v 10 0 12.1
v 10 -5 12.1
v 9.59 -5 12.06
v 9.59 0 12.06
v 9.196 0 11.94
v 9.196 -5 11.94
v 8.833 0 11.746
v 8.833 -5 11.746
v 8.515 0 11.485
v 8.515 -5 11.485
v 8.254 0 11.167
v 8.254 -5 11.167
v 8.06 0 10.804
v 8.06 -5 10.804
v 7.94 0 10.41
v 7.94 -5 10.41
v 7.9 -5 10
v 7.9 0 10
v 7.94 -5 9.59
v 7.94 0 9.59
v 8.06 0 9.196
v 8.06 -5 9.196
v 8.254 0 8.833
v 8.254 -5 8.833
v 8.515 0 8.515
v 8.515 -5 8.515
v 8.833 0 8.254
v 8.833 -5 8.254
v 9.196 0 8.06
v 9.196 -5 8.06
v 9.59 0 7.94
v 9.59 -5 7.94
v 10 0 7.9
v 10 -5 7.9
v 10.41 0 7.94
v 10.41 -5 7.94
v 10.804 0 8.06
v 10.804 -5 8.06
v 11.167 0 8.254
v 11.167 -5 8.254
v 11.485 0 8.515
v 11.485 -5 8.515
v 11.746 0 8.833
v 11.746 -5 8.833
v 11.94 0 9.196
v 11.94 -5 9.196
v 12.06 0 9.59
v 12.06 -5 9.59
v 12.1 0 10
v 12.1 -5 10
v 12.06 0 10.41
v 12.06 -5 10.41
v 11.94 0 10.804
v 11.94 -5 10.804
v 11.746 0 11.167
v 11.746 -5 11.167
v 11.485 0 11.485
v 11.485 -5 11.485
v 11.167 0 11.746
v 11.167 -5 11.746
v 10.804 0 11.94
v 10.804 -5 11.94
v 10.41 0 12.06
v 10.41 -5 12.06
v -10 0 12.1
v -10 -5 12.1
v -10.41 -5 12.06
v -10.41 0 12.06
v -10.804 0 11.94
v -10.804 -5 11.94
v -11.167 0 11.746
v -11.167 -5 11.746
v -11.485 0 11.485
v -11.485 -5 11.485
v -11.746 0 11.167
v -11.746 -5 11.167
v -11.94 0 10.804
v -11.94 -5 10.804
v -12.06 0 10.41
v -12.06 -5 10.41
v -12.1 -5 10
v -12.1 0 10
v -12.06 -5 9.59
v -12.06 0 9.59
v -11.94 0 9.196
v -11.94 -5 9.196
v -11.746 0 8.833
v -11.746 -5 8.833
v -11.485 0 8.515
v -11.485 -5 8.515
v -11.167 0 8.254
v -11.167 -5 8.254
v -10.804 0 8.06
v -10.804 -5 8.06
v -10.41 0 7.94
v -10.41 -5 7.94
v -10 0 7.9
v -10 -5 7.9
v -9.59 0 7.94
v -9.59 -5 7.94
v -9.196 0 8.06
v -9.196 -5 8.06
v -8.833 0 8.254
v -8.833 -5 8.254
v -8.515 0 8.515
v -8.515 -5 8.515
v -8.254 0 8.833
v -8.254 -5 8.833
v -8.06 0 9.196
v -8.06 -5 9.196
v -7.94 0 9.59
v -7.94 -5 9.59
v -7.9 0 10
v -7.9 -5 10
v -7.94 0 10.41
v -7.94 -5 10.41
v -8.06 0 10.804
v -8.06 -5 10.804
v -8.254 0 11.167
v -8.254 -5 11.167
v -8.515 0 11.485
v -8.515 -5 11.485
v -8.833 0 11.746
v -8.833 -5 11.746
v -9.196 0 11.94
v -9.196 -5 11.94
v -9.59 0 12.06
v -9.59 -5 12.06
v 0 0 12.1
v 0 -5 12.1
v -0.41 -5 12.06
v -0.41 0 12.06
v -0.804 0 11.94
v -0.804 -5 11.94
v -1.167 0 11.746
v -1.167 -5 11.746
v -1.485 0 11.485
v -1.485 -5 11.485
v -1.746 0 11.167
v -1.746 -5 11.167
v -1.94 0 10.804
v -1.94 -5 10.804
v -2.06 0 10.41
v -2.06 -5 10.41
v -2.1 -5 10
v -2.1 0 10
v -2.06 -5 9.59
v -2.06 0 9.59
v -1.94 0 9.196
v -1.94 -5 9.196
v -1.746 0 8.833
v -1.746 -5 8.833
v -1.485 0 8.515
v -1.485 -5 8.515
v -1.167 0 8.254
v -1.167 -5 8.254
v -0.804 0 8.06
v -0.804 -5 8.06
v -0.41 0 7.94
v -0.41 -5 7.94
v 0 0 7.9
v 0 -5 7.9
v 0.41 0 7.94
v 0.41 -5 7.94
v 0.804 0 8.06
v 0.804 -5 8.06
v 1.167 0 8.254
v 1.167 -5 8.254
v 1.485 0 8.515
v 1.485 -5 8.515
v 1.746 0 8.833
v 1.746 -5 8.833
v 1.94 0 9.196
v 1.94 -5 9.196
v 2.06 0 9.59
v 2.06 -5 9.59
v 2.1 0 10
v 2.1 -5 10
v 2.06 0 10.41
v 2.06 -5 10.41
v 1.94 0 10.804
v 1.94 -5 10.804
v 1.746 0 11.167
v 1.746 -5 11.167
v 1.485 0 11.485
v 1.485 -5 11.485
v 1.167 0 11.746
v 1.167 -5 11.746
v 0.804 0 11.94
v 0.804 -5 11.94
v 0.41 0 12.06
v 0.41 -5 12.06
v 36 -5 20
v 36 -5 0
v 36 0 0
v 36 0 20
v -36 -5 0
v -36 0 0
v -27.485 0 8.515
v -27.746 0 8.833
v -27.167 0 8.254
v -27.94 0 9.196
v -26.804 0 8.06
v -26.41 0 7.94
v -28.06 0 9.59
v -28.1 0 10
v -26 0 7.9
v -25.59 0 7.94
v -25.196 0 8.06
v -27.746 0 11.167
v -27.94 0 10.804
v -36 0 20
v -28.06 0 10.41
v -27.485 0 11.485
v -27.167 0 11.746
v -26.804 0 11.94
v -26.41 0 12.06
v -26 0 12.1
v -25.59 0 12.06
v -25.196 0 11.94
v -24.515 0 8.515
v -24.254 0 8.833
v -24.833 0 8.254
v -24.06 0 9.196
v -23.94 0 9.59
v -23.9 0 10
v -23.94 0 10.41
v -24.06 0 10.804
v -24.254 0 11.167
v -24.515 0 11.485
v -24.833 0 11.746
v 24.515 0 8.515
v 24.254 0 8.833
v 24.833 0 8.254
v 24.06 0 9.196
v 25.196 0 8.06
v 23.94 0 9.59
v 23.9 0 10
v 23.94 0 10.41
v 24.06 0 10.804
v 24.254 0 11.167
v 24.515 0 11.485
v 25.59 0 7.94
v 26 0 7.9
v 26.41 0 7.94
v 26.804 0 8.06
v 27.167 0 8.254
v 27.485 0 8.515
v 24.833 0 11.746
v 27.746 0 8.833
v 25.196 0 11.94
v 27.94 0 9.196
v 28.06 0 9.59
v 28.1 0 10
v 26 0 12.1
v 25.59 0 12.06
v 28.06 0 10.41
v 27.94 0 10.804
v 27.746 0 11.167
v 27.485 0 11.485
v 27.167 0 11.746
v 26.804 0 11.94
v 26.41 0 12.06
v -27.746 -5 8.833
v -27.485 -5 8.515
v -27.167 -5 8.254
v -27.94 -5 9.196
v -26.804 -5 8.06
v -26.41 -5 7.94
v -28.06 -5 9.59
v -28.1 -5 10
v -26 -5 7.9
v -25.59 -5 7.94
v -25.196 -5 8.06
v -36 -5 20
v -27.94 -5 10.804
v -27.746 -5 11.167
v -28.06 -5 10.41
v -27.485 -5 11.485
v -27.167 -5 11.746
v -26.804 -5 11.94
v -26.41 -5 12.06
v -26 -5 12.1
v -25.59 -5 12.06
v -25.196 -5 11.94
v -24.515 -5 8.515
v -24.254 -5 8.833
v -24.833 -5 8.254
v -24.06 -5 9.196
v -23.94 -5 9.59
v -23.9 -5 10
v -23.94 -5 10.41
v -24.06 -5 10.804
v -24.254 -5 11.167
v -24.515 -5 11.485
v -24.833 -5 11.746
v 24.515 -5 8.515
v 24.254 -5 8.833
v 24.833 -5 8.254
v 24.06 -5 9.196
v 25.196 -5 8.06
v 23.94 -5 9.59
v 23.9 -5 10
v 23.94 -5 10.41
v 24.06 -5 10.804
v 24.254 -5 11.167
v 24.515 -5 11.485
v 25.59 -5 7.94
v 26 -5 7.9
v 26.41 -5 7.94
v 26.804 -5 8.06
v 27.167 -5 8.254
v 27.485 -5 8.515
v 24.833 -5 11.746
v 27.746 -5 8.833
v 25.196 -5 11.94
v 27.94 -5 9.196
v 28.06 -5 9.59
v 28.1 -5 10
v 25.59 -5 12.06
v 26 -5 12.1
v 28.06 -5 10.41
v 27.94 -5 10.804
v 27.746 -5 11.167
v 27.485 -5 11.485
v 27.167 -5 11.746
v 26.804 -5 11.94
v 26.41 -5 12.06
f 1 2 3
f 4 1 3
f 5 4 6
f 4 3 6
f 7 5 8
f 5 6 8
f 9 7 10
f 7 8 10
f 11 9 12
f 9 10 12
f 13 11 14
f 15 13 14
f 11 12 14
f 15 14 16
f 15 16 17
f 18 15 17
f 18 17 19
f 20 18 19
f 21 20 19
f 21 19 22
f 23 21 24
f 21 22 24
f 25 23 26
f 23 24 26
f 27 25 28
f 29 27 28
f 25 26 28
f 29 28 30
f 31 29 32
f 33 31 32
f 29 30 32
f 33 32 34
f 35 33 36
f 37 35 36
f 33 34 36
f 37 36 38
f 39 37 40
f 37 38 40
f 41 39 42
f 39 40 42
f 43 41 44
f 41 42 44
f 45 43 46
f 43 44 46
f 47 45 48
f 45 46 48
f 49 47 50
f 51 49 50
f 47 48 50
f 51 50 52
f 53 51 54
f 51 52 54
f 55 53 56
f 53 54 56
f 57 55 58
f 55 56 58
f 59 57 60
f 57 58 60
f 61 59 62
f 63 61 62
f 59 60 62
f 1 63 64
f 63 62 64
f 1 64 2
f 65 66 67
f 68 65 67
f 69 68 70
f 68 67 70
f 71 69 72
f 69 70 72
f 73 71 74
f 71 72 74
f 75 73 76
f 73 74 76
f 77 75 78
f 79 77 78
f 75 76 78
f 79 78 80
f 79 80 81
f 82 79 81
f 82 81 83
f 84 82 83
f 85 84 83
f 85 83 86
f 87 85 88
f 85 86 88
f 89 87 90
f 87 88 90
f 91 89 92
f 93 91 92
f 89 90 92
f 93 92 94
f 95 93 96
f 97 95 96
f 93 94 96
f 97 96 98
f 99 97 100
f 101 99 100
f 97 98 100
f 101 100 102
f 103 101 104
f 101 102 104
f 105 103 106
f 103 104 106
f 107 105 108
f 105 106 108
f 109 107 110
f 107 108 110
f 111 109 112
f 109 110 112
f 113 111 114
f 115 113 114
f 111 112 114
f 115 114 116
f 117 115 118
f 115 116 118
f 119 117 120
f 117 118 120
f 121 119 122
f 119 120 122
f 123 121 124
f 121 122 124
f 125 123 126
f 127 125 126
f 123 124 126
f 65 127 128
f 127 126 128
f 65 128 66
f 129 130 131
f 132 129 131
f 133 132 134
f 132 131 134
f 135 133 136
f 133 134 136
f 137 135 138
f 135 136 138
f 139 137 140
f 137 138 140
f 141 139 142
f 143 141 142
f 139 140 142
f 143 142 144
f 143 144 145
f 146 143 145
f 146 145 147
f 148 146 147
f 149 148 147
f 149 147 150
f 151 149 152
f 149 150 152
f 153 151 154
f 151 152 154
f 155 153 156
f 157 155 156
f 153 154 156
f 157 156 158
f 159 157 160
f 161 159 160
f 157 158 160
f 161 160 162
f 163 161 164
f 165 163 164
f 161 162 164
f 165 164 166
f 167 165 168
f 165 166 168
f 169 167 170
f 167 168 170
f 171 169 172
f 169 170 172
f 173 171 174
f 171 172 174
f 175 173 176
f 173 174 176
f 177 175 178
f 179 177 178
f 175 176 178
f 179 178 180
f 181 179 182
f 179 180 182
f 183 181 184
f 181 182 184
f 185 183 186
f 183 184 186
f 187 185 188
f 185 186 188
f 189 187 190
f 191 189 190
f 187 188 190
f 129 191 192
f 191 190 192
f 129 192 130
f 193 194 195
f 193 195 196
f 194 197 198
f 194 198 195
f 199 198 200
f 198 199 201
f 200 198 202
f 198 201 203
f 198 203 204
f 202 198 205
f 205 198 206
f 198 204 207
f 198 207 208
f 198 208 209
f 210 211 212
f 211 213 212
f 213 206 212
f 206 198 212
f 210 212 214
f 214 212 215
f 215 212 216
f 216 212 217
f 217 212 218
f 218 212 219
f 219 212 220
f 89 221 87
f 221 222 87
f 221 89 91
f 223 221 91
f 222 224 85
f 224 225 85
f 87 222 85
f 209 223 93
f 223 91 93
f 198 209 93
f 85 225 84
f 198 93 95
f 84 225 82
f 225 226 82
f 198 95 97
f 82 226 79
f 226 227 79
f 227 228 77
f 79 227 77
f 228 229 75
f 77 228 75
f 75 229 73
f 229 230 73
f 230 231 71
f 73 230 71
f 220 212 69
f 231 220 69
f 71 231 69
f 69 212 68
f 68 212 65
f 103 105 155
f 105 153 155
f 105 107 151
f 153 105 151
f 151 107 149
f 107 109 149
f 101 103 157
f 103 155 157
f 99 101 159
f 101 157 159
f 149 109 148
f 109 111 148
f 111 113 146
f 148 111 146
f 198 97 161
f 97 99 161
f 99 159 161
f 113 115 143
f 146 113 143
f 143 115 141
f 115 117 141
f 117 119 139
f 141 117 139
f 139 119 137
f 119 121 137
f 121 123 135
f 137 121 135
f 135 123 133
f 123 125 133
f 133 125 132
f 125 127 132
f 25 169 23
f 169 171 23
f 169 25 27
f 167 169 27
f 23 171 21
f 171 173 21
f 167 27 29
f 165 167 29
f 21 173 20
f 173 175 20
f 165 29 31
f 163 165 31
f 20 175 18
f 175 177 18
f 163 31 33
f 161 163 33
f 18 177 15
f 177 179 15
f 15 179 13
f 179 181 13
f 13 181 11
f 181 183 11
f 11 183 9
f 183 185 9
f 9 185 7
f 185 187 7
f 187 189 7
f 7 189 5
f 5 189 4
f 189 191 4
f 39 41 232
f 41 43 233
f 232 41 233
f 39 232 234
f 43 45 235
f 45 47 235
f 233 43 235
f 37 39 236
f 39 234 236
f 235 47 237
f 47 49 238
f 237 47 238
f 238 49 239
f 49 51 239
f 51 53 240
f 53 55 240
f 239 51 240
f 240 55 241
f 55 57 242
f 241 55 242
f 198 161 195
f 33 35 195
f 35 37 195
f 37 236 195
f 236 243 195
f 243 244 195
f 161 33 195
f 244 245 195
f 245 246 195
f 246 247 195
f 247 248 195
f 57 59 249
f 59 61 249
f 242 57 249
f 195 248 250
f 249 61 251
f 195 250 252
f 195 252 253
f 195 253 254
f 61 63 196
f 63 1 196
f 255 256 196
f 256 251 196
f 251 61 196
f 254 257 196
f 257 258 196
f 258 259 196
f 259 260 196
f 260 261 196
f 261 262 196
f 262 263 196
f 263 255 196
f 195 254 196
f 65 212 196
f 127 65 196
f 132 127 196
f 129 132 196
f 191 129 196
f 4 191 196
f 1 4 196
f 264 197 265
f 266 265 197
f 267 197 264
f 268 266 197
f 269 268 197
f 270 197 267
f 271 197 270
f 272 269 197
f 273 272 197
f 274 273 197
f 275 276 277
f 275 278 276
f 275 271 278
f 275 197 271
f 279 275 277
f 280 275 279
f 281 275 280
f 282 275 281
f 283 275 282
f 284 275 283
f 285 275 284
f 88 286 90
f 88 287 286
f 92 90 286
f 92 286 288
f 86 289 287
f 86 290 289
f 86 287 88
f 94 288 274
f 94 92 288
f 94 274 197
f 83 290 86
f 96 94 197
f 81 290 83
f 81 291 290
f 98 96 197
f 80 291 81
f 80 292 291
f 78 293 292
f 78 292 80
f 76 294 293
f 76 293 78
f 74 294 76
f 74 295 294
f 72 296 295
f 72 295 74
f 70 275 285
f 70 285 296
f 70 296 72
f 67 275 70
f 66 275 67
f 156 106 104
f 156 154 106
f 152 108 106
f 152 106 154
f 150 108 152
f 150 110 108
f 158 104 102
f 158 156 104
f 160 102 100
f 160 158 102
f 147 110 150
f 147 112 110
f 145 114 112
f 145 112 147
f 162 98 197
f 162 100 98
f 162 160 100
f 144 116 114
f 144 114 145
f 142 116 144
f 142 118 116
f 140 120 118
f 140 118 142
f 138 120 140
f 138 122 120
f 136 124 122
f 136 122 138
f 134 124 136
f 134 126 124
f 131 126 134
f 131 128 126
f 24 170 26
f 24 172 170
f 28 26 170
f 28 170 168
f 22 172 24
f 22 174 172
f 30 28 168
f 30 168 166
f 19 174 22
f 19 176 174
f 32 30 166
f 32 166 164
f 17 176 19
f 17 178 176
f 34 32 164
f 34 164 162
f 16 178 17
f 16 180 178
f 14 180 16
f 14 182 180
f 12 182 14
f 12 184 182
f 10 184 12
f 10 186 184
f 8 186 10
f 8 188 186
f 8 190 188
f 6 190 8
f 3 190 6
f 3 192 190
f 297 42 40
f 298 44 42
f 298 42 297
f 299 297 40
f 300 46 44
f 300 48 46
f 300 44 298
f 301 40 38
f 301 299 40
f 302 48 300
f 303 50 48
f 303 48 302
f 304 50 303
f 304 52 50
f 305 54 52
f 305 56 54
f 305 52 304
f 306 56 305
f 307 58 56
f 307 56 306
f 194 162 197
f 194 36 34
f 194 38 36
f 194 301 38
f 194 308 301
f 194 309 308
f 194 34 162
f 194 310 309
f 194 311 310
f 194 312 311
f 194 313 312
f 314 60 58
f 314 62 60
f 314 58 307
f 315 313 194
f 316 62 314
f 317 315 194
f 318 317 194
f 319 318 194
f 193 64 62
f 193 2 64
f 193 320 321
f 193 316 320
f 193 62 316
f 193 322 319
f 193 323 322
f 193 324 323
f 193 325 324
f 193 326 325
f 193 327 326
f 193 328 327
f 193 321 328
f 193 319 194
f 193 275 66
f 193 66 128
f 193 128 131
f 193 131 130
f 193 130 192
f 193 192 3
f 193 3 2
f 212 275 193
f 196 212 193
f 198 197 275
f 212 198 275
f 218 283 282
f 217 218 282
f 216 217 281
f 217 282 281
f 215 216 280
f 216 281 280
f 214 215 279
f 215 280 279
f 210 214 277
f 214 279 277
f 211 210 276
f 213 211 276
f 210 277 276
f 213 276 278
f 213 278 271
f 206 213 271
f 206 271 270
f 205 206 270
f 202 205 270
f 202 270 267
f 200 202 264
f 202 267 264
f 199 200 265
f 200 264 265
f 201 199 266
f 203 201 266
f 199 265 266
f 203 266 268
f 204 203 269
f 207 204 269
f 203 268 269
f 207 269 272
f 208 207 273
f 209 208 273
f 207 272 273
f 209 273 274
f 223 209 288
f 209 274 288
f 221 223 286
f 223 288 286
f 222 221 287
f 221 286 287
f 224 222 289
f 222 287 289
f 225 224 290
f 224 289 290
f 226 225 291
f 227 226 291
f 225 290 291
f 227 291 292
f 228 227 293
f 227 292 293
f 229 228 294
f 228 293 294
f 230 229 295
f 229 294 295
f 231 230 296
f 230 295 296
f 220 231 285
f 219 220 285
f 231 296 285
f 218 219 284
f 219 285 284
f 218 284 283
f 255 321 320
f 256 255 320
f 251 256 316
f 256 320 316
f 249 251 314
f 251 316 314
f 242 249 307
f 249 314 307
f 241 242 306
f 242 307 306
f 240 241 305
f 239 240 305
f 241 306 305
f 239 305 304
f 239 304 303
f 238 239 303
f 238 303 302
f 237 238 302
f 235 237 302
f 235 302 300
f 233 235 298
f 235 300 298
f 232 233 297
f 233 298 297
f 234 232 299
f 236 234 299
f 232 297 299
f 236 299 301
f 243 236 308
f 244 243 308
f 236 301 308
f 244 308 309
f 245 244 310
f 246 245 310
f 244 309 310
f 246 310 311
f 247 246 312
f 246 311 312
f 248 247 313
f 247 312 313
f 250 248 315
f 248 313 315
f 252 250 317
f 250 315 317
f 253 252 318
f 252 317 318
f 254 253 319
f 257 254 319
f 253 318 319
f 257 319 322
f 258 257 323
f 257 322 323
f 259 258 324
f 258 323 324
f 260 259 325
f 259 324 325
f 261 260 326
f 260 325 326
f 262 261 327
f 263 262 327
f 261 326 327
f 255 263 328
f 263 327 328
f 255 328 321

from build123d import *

# Parameters (mm, degrees)
SKETCH_1_W      = 72
SKETCH_1_H      = 20
SKETCH_1_R      = 2.1
EXTRUDE_1_DEPTH = 5


with BuildPart() as part:
    # 草图1 → 凸台-拉伸1 (new body)
    with BuildSketch(Plane.XZ.offset(5)):
        with Locations((0, 10)):
            Rectangle(SKETCH_1_W, SKETCH_1_H)
        with Locations(Location((10, 10, 0), (0, 0, 90))):
            Circle(SKETCH_1_R, mode=Mode.SUBTRACT)
        with Locations(Location((26, 10, 0), (0, 0, 90))):
            Circle(SKETCH_1_R, mode=Mode.SUBTRACT)
        with Locations(Location((-10, 10, 0), (0, 0, 90))):
            Circle(SKETCH_1_R, mode=Mode.SUBTRACT)
        with Locations(Location((-26, 10, 0), (0, 0, 90))):
            Circle(SKETCH_1_R, mode=Mode.SUBTRACT)
        with Locations(Location((0, 10, 0), (0, 0, 90))):
            Circle(SKETCH_1_R, mode=Mode.SUBTRACT)
    extrude(amount=-EXTRUDE_1_DEPTH)


solid = part.part
